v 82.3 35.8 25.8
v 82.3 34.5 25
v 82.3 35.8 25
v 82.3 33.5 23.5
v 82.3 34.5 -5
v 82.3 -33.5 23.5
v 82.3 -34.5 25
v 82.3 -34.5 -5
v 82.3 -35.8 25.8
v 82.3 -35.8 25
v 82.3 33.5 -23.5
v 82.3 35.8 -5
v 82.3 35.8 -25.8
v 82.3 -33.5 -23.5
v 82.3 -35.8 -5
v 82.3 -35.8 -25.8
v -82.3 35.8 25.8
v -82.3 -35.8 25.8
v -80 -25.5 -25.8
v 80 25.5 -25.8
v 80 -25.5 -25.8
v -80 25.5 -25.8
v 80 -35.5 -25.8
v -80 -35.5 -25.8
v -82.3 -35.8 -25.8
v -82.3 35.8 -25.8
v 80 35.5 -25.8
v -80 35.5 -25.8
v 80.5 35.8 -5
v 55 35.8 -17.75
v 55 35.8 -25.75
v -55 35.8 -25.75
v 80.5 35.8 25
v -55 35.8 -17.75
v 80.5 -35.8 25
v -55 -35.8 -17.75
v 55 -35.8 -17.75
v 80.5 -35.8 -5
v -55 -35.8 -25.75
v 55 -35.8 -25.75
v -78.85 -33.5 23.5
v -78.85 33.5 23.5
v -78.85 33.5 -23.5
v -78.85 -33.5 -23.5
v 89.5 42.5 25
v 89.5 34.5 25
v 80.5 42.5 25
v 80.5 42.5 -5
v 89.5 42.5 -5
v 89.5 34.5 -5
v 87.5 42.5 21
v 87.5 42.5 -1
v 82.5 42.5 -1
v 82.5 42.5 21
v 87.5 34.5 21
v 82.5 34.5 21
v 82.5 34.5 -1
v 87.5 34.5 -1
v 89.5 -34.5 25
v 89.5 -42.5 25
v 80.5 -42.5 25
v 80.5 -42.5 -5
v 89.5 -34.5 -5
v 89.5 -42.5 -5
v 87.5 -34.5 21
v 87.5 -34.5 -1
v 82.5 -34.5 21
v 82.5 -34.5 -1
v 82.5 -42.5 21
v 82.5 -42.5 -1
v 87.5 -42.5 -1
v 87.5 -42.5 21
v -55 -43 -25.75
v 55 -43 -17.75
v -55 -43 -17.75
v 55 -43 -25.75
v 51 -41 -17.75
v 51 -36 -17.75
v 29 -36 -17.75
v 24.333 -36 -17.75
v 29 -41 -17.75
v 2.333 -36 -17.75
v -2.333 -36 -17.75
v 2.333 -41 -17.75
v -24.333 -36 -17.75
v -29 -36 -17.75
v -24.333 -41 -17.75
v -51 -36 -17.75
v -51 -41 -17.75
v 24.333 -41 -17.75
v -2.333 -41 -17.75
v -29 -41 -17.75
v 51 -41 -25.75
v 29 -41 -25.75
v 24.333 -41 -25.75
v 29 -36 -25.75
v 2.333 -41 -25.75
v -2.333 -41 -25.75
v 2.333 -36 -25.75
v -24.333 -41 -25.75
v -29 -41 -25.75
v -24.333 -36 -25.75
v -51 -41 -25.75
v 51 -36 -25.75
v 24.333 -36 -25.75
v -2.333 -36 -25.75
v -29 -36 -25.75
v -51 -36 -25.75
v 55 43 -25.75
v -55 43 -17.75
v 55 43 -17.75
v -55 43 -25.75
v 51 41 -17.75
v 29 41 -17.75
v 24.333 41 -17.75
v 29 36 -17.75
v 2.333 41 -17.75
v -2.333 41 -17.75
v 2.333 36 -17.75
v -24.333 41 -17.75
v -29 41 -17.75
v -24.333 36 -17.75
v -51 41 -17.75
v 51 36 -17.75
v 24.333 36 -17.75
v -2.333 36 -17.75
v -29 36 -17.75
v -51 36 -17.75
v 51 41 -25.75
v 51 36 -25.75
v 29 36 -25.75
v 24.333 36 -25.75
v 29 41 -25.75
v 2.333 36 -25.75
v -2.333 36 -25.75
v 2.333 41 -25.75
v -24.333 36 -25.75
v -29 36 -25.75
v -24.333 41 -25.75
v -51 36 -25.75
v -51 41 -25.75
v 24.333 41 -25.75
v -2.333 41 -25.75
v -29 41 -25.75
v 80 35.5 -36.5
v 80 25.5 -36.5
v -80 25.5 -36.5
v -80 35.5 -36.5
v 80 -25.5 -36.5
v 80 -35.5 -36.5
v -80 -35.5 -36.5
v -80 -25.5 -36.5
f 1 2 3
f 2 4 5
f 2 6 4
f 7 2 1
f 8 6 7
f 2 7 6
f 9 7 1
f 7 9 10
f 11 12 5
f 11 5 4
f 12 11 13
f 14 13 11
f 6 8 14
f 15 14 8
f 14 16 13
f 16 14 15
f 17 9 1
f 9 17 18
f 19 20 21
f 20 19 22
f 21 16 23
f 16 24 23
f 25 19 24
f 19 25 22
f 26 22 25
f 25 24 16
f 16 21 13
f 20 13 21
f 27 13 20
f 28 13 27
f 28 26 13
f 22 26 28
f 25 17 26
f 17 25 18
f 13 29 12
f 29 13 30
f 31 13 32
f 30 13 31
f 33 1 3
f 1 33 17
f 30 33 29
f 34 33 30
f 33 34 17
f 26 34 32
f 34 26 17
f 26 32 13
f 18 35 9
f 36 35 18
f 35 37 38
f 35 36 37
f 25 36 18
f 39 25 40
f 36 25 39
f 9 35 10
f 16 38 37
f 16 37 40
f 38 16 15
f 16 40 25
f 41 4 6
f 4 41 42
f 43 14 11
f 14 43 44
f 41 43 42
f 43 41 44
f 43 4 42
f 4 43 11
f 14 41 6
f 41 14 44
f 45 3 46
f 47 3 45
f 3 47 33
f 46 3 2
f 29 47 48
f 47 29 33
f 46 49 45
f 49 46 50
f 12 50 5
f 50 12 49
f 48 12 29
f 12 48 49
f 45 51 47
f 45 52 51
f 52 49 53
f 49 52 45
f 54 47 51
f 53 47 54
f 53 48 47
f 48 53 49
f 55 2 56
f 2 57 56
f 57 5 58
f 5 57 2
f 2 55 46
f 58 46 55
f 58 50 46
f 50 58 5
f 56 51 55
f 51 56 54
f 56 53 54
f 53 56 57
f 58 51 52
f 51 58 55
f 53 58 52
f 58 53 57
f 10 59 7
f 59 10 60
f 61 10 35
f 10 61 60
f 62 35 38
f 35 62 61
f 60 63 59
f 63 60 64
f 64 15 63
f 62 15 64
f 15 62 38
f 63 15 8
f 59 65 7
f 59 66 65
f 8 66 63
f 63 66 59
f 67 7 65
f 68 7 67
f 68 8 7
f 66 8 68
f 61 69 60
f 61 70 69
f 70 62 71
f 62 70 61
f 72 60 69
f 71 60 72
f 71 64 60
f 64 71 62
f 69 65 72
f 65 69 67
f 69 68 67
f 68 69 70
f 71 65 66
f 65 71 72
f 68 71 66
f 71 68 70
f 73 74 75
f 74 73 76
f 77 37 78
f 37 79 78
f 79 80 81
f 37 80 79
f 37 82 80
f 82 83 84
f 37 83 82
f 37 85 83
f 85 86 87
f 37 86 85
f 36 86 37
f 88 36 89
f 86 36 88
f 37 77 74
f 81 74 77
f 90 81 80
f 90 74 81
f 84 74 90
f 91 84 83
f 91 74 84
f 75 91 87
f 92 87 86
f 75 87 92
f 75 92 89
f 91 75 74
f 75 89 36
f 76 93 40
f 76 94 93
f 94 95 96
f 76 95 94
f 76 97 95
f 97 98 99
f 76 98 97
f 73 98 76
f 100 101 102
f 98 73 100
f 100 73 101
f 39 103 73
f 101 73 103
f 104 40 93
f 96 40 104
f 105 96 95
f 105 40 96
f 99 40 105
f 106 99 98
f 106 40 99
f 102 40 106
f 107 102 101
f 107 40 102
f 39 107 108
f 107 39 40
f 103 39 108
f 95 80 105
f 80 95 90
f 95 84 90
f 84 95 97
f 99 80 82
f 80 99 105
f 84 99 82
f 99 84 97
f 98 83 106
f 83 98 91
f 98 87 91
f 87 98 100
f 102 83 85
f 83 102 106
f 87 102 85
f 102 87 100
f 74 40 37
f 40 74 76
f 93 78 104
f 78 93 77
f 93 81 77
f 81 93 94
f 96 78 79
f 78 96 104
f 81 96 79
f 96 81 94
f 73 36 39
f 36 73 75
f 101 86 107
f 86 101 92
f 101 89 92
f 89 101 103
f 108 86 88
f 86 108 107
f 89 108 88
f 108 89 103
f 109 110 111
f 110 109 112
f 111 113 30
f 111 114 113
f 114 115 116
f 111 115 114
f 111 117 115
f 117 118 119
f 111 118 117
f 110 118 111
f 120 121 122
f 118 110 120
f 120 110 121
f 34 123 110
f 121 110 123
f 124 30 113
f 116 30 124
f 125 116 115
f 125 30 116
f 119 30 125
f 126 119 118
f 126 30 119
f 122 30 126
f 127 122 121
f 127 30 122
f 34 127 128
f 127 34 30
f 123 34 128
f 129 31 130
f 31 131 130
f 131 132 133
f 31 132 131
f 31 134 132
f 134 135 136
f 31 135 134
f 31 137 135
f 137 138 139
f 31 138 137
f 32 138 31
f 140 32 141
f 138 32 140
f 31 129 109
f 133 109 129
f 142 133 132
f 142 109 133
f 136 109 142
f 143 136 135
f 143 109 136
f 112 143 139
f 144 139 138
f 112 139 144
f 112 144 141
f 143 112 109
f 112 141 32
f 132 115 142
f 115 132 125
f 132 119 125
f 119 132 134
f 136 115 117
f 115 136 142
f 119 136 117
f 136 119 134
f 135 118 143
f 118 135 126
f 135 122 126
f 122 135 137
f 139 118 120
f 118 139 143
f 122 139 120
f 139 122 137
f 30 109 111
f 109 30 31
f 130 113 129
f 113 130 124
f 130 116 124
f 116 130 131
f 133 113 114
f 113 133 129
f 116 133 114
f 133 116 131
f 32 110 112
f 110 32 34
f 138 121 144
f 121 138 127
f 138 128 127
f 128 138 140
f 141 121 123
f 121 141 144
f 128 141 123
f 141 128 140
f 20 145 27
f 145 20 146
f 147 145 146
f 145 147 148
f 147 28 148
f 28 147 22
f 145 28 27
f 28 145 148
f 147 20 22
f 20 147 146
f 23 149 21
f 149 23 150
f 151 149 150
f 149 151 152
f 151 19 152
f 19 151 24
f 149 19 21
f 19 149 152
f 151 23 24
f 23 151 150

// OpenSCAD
/**
 * Battery Holder
 * ==============
 * Secure mounting system for FullSend 10A batteries
 *
 * Self-contained: all parameters and helper modules live in this file.
 */

// =============================================================================
// PARAMETERS
// =============================================================================

// FullSend 10A battery dimensions (mm)
BATTERY_LENGTH = 160;
BATTERY_WIDTH = 67;
BATTERY_DEPTH = 47;
BATTERY_CLEARANCE = 2.3;  // inner spacing around battery

// Strap handle dimensions (mm)
STRAP_HANDLE_THICKNESS = 4;
STRAP_HANDLE_WIDTH = 8;
STRAP_HANDLE_HEIGHT = 5;

// =============================================================================
// STRAP HANDLE
// =============================================================================

/**
 * Strap Handle - zip-tie or velcro strap loop
 * Used for securing the battery to the bay
 */
module strap_handle() {
    thickness = STRAP_HANDLE_THICKNESS;
    width = STRAP_HANDLE_WIDTH;
    height = STRAP_HANDLE_HEIGHT;

    difference() {
        // Outer block
        cube([22 + 2*thickness, width, height + thickness], center=true);

        // Inner cutout for strap
        cube([22, width + 1, height], center=true);
    }
}

// =============================================================================
// FULLSEND 10A BATTERY BAY
// =============================================================================

/**
 * FullSend 10A Battery Holder
 *
 * Features:
 *   - Protective enclosure with one open side for easy insertion
 *   - Multiple strap handle positions for secure retention
 *   - Handles on rear, middle-front, and middle-back
 *   - Optimized for 160x65x45mm battery pack
 *
 * Battery Specifications:
 *   - Length: 160mm
 *   - Width: 65mm
 *   - Depth: 45mm
 */
module fullsend10a_battery_bay() {
    inner_space = BATTERY_CLEARANCE;
    batt_length = BATTERY_LENGTH;
    batt_width = BATTERY_WIDTH;
    batt_depth = BATTERY_DEPTH;

    // =========================================================================
    // Main Battery Enclosure
    // =========================================================================

    difference() {
        // Outer shell
        cube([
            batt_length + 2*inner_space,
            batt_width + 2*inner_space,
            batt_depth + 2*inner_space
        ], center=true);

        // Inner cavity (offset for single open side)
        translate([inner_space, 0, 0])
            cube([
                batt_length + inner_space,
                batt_width,
                batt_depth
            ], center=true);
    }

    // =========================================================================
    // Strap Handles - Rear Position
    // =========================================================================

    // Rear left handle
    rotate([0, -90, 0])
        translate([10, batt_width/2 + 5, -batt_length/2 - 5])
            strap_handle();

    // Rear right handle
    rotate([0, -90, 0])
        translate([10, -batt_width/2 - 5, -batt_length/2 - 5])
            strap_handle();

    // =========================================================================
    // Strap Handles - Middle-Front Position (Bottom)
    // =========================================================================

    // Front-left position 1
    translate([batt_length/12, -batt_width/2 - 5, -batt_depth/2 + 1.75])
        rotate([90, 0, 0])
            strap_handle();

    // Front-left position 2
    translate([-batt_length/12, -batt_width/2 - 5, -batt_depth/2 + 1.75])
        rotate([90, 0, 0])
            strap_handle();

    // Front-left position 3
    translate([batt_length/4, -batt_width/2 - 5, -batt_depth/2 + 1.75])
        rotate([90, 0, 0])
            strap_handle();

    // Front-left position 4
    translate([-batt_length/4, -batt_width/2 - 5, -batt_depth/2 + 1.75])
        rotate([90, 0, 0])
            strap_handle();

    // =========================================================================
    // Strap Handles - Middle-Back Position (Top)
    // =========================================================================

    // Back-right position 1
    translate([batt_length/12, batt_width/2 + 5, -batt_depth/2 + 1.75])
        rotate([90, 0, 0])
            strap_handle();

    // Back-right position 2
    translate([-batt_length/12, batt_width/2 + 5, -batt_depth/2 + 1.75])
        rotate([90, 0, 0])
            strap_handle();

    // Back-right position 3
    translate([batt_length/4, batt_width/2 + 5, -batt_depth/2 + 1.75])
        rotate([90, 0, 0])
            strap_handle();

    // Back-right position 4
    translate([-batt_length/4, batt_width/2 + 5, -batt_depth/2 + 1.75])
        rotate([90, 0, 0])
            strap_handle();
            
    // ======================================================================
    // wire passage
    // ======================================================================
    translate([0, batt_width/2-3 , -batt_depth/2 - 7])
        cube ([batt_length,10,12],center=true);
    translate([0, -batt_width/2+3, -batt_depth/2 -7])
        cube ([batt_length,10,12],center=true);


}

// =============================================================================
// USAGE EXAMPLES (uncomment to render)
// =============================================================================

// Render battery bay
fullsend10a_battery_bay();

// =============================================================================
// PRINTING NOTES
// =============================================================================

/*
 * Recommended Print Settings:
 *   - Layer Height: 0.2mm - 0.3mm
 *   - Wall Count: 3-4 perimeters
 *   - Infill: 20-30% gyroid or honeycomb
 *   - Support: May need support for strap handles depending on orientation
 *
 * Recommended Orientation:
 *   - Print with battery opening facing up for minimal supports
 *   - Strap handles may need light support material
 *
 * Post-Processing:
 *   - Test fit battery before installing
 *   - Use 20-25mm wide velcro/battery straps
 *   - Ensure clearance is adequate (adjust BATTERY_CLEARANCE above if needed)
 */
